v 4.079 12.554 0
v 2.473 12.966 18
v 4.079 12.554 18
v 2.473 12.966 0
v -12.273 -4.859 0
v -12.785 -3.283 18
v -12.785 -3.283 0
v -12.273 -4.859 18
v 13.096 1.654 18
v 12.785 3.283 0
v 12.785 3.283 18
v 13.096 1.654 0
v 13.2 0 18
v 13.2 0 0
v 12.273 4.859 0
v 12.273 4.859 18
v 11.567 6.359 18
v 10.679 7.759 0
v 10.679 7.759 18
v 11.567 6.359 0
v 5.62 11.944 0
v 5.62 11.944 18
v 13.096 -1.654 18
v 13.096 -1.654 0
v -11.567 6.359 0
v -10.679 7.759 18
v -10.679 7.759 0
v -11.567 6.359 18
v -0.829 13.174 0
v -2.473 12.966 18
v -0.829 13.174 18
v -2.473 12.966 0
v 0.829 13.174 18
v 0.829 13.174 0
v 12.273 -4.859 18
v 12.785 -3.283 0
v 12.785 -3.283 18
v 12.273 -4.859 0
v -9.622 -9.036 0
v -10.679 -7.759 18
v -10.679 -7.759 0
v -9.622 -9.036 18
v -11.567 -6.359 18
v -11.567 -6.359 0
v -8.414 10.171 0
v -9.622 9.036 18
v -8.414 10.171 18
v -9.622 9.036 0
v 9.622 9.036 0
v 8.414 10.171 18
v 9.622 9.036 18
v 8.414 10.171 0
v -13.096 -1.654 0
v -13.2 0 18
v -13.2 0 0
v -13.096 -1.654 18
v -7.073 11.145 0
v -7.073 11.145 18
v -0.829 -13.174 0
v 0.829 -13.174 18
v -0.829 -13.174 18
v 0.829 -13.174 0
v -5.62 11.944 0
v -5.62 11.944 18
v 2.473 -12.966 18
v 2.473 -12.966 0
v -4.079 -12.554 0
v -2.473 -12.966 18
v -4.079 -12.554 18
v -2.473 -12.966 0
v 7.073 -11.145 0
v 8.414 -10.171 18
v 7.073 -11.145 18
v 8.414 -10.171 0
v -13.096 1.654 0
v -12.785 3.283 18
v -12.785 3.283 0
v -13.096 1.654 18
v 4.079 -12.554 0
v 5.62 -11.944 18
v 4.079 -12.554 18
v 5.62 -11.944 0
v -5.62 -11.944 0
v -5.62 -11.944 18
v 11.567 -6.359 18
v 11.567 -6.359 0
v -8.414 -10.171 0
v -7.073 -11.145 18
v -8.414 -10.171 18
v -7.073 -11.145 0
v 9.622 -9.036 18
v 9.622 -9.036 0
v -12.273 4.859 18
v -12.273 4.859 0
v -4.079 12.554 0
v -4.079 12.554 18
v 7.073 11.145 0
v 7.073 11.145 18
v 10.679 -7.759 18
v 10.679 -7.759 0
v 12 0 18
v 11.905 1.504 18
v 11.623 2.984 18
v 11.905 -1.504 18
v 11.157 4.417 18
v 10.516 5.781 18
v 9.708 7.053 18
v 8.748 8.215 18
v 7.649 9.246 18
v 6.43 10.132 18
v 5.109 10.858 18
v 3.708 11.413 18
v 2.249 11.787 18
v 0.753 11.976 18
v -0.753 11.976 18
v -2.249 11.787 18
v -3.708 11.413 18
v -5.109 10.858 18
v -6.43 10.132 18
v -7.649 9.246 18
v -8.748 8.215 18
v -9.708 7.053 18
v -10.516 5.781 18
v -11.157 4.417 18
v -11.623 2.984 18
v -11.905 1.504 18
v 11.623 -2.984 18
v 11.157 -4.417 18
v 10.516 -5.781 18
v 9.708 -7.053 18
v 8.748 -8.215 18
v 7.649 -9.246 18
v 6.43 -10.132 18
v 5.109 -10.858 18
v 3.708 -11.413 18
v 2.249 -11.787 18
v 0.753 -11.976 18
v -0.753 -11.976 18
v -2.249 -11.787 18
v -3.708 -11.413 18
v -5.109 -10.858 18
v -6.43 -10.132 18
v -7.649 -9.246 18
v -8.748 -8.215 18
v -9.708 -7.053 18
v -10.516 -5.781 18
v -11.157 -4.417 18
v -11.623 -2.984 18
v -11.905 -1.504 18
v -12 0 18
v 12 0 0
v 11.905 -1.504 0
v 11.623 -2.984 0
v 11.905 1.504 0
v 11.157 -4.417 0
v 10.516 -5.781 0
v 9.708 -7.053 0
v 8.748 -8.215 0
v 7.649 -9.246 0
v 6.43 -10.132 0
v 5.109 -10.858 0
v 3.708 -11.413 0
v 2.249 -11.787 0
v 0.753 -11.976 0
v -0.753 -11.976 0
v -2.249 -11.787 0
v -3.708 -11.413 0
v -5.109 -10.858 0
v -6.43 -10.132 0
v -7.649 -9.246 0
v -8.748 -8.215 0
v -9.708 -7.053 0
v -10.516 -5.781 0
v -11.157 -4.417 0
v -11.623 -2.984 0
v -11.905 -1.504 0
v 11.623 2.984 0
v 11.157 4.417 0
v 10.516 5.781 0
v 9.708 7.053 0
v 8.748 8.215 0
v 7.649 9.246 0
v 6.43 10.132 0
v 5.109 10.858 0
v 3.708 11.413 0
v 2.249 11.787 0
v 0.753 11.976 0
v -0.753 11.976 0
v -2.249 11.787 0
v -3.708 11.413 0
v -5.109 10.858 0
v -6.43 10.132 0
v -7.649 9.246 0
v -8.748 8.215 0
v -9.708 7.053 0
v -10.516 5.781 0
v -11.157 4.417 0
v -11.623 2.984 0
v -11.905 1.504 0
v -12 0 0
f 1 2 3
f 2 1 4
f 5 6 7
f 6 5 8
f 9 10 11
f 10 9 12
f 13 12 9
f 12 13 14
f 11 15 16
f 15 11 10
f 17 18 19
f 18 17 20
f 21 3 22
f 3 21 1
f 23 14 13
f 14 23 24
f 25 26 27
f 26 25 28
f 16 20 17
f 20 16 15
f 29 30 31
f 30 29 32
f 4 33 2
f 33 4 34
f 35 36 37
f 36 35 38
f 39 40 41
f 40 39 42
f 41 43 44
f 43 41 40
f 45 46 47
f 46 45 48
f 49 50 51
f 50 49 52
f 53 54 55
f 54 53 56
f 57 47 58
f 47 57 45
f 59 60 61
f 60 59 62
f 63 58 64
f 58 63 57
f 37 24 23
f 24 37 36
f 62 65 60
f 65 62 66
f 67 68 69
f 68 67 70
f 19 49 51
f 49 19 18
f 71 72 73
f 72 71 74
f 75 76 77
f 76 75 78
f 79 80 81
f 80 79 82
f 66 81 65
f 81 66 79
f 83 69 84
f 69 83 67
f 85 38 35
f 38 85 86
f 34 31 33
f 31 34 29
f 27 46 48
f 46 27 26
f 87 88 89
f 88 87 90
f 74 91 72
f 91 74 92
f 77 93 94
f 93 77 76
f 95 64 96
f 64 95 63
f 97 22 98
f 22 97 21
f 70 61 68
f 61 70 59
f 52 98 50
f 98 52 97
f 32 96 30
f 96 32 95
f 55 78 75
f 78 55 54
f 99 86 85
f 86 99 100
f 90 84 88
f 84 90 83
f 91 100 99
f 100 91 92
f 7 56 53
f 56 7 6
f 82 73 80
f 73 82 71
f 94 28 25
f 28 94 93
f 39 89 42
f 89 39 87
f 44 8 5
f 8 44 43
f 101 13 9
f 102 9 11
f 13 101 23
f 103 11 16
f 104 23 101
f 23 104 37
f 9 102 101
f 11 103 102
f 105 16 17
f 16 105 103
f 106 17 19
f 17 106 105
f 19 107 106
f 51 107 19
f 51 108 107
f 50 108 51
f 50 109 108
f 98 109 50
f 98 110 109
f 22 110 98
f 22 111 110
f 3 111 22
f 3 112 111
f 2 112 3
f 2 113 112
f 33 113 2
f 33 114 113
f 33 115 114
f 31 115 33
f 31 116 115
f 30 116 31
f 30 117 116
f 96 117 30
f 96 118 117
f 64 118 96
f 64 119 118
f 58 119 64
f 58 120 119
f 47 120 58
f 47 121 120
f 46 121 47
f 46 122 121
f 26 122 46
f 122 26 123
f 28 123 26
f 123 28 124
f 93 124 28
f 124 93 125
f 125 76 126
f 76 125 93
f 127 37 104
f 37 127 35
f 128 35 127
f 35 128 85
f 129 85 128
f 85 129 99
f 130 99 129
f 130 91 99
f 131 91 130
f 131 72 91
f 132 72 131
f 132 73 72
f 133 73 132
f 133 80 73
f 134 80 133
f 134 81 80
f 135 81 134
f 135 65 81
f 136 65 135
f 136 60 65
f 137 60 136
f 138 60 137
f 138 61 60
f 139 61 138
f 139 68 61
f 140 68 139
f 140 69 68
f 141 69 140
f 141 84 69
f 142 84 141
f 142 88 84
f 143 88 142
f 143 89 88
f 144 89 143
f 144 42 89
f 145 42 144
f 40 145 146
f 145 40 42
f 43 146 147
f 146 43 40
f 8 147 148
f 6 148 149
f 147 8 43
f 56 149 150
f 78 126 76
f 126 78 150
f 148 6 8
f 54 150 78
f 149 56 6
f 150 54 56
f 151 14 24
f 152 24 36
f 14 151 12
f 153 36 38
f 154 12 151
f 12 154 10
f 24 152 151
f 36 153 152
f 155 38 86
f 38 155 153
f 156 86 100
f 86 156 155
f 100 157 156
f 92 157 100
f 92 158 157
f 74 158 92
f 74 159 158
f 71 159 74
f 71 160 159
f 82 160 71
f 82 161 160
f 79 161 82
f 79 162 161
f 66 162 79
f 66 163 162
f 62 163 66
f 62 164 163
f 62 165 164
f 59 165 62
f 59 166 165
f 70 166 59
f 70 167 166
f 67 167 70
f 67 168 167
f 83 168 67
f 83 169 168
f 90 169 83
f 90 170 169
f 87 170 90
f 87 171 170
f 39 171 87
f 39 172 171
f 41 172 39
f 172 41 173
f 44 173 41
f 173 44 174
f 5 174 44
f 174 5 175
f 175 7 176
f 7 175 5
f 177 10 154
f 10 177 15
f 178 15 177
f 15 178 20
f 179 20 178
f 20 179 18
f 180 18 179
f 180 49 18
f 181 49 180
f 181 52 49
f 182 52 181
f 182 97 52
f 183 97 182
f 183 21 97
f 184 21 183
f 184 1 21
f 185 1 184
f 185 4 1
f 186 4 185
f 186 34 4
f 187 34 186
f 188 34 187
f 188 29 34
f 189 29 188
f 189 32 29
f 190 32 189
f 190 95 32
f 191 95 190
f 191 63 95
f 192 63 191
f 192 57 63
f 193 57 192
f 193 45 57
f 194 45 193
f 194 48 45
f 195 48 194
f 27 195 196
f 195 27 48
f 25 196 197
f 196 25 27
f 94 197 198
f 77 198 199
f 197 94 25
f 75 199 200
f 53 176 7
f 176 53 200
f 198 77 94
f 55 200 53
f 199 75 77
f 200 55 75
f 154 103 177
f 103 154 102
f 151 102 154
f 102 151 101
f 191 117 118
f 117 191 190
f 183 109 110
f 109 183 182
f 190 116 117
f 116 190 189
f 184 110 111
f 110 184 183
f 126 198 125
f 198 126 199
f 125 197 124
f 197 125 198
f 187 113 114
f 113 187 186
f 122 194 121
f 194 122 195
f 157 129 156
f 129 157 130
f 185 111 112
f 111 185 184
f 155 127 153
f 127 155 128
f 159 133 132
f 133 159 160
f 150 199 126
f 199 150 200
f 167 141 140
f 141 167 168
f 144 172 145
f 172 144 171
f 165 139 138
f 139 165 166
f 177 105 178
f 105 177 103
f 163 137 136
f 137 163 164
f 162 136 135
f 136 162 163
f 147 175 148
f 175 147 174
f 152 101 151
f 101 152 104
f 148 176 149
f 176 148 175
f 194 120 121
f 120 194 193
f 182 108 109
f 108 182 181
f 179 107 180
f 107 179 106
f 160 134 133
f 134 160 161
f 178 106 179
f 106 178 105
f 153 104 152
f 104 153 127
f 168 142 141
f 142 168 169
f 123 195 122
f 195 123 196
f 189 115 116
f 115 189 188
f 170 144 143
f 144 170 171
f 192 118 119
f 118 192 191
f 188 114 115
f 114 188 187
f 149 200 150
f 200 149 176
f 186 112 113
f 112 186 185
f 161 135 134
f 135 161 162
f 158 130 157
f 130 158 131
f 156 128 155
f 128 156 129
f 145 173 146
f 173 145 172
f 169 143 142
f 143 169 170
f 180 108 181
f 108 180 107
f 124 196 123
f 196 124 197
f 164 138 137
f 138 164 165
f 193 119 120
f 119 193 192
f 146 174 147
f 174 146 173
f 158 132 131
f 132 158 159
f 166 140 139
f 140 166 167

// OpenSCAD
$fn = 50;

difference() {
	union() {
		translate(v = [0, 0, 0]) {
			rotate(a = [0, 0, 0]) {
				difference() {
					union() {
						cylinder(h = 18, r = 13.2);
					}
					union() {
						cylinder(h = 18, r = 12);
					}
				}
			}
		}
	}
	union();
}
